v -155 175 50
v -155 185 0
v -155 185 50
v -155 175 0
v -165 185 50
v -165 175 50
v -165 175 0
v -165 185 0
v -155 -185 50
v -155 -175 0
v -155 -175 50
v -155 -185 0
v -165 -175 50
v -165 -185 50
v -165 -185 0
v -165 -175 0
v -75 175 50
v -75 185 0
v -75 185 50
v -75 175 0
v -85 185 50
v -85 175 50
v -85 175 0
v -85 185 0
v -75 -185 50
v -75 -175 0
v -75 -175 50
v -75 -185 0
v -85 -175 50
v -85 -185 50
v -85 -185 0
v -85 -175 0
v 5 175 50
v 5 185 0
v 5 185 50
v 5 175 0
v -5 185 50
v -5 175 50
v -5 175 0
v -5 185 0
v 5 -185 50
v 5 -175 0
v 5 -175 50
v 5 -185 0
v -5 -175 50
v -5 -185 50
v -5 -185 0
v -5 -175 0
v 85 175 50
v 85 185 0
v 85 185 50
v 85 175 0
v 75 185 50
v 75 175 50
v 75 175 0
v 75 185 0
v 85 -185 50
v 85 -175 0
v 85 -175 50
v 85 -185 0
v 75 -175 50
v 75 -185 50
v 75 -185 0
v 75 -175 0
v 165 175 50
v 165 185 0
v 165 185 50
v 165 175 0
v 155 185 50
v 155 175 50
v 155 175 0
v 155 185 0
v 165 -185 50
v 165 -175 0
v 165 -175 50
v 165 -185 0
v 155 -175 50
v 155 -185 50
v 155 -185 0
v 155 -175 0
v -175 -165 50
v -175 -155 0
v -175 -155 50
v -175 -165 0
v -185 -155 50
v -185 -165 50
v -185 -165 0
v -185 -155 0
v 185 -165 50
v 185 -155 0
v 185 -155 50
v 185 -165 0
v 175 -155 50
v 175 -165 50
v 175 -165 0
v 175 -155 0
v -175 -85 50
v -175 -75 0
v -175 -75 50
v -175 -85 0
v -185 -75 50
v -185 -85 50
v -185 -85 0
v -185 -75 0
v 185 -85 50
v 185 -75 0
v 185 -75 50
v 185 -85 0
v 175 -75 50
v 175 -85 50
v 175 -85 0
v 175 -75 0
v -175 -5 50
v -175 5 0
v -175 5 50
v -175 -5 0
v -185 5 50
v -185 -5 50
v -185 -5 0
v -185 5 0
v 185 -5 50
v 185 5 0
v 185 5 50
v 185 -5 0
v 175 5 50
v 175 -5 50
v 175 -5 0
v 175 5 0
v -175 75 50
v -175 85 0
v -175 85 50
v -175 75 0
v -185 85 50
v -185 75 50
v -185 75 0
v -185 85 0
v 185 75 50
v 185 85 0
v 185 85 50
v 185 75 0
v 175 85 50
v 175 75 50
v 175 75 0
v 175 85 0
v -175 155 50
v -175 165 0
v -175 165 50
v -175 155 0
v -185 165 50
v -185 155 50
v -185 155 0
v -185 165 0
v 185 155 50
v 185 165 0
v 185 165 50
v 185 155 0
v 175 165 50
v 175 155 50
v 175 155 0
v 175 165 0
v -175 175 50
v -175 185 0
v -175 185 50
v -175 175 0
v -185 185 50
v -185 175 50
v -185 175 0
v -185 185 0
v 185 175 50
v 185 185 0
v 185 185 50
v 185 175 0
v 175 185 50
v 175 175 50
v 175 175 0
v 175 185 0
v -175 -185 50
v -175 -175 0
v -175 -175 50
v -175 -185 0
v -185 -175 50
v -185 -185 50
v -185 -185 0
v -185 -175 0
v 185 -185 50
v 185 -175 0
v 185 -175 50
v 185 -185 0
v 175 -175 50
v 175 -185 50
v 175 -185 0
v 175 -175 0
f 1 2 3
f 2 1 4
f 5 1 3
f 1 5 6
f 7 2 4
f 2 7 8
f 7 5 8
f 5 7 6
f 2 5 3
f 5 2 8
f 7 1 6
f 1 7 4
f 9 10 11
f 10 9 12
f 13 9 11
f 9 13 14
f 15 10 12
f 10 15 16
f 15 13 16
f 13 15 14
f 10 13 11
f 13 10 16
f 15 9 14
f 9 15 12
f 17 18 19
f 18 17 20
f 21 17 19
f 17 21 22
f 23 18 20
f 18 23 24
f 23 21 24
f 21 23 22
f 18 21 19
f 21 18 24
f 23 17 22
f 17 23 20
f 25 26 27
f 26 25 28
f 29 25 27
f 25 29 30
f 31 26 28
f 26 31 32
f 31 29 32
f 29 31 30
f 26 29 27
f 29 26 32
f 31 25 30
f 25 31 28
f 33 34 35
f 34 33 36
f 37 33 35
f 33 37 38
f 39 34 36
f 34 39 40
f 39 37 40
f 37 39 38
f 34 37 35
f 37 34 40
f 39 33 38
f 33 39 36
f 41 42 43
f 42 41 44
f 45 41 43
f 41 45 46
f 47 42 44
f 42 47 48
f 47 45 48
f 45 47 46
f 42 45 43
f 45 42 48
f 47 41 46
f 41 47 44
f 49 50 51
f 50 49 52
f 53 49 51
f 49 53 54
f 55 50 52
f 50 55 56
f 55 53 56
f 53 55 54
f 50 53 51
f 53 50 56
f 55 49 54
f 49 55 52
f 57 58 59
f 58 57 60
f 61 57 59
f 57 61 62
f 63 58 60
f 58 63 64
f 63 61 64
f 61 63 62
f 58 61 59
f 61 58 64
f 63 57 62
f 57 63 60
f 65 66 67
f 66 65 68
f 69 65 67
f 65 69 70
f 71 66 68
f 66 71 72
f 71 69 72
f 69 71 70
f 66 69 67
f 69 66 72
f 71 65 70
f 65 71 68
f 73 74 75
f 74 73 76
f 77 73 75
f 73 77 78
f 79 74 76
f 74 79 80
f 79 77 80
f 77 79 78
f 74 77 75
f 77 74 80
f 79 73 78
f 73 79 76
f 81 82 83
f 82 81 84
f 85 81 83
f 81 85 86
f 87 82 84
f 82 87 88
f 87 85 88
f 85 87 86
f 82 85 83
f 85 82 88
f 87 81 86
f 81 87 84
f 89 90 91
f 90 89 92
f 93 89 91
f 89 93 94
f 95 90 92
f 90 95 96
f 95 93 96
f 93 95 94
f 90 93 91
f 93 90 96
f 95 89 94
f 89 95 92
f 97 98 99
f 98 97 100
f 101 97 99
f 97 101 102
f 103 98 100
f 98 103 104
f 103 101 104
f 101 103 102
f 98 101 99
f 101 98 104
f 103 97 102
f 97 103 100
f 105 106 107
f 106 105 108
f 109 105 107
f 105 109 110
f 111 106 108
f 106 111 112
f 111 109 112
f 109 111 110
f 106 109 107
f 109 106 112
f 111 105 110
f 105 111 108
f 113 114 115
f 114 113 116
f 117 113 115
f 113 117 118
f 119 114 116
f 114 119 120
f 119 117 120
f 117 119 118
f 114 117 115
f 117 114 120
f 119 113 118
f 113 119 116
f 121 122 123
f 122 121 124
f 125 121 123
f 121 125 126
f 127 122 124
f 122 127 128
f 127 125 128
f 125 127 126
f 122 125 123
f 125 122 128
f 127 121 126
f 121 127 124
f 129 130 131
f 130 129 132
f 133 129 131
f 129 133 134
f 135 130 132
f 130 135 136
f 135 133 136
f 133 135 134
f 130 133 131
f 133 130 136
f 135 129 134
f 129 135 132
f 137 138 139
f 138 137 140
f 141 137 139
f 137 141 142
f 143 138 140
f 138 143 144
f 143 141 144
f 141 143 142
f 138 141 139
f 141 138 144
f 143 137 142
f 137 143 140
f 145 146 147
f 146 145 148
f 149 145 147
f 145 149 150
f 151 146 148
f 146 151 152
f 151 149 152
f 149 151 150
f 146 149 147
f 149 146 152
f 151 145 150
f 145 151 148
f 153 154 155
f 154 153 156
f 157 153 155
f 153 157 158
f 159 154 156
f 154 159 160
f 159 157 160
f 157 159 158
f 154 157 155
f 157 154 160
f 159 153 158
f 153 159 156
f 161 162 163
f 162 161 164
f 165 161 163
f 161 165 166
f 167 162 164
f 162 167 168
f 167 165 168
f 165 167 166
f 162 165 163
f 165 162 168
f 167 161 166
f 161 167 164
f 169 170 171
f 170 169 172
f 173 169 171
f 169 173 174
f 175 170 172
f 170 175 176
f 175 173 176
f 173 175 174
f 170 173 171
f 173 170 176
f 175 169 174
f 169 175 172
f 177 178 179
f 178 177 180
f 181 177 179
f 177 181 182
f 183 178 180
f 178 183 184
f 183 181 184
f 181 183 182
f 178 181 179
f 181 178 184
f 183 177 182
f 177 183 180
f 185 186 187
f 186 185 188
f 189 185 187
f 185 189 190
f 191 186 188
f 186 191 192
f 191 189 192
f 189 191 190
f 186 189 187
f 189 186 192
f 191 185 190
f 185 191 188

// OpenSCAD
// Cage slice 5
// Internal cavity: 350 x 350 x 700 mm
// Bar thickness: 10 mm (square)
// Gap between bars: 70 mm (uniform)
// Slice index: 5, slice Z range: [250, 300] (local coordinates 0..50)
// This file places the slice with its bottom on Z=0; when assembling, translate in Z by 250 mm.
// Export to STL with OpenSCAD: Render -> Export as STL.

bar = 10;
gap = 70;
s = bar + gap;
$fn = 64;  // cylinder resolution

x_centers = [-160, -80, 0, 80, 160];
y_centers = [-160, -80, 0, 80, 160];
z_centers = [5, 85, 165, 245, 325, 405, 485, 565, 645];

slice_index = 5;
slice_h = 50;

front_y = 180;
back_y = -180;
left_x = -180;
right_x = 180;
panel_length = 370;

hole_diam = 6.6;

module slice() {
    union() {
        // vertical bars on front and back (along Z)
        for (x = x_centers) {
            translate([x, front_y, slice_h/2]) cube([bar, bar, slice_h], center=true);
            translate([x, back_y, slice_h/2])  cube([bar, bar, slice_h], center=true);
        }
        // vertical bars on left and right (along Z)
        for (y = y_centers) {
            translate([left_x, y, slice_h/2])  cube([bar, bar, slice_h], center=true);
            translate([right_x, y, slice_h/2]) cube([bar, bar, slice_h], center=true);
        }
        // explicit corner vertical bars (ensure 4 corners for M6 rods)
        translate([-180, 180, slice_h/2]) cube([bar, bar, slice_h], center=true);
        translate([180, 180, slice_h/2]) cube([bar, bar, slice_h], center=true);
        translate([-180, -180, slice_h/2]) cube([bar, bar, slice_h], center=true);
        translate([180, -180, slice_h/2]) cube([bar, bar, slice_h], center=true);

        // horizontal bars (10 mm thick in Z) that lie inside this slice
        for (zc = z_centers) {
            z_local = zc - slice_index*slice_h;
            // include this horizontal bar if its center lies within this slice and it fits entirely here
            if (z_local >= bar/2 && z_local <= slice_h - bar/2) {
                // front and back horizontal bars (run along X)
                translate([0, front_y, z_local]) cube([panel_length, bar, bar], center=true);
                translate([0, back_y,  z_local]) cube([panel_length, bar, bar], center=true);
                // left and right horizontal bars (run along Y)
                translate([left_x, 0, z_local]) cube([bar, panel_length, bar], center=true);
                translate([right_x,0, z_local]) cube([bar, panel_length, bar], center=true);
            }
        }
    }
}

difference() {
    slice();
    // four vertical holes for M6 rods through corner bars (slightly longer than slice to ensure clean subtraction)
    translate([-180, 180, slice_h/2]) rotate([0,0,0]) cylinder(h = slice_h*4, r = hole_diam/2, center=true);
    translate([180, 180, slice_h/2]) rotate([0,0,0]) cylinder(h = slice_h*4, r = hole_diam/2, center=true);
    translate([-180, -180, slice_h/2]) rotate([0,0,0]) cylinder(h = slice_h*4, r = hole_diam/2, center=true);
    translate([180, -180, slice_h/2]) rotate([0,0,0]) cylinder(h = slice_h*4, r = hole_diam/2, center=true);
}

slice();
